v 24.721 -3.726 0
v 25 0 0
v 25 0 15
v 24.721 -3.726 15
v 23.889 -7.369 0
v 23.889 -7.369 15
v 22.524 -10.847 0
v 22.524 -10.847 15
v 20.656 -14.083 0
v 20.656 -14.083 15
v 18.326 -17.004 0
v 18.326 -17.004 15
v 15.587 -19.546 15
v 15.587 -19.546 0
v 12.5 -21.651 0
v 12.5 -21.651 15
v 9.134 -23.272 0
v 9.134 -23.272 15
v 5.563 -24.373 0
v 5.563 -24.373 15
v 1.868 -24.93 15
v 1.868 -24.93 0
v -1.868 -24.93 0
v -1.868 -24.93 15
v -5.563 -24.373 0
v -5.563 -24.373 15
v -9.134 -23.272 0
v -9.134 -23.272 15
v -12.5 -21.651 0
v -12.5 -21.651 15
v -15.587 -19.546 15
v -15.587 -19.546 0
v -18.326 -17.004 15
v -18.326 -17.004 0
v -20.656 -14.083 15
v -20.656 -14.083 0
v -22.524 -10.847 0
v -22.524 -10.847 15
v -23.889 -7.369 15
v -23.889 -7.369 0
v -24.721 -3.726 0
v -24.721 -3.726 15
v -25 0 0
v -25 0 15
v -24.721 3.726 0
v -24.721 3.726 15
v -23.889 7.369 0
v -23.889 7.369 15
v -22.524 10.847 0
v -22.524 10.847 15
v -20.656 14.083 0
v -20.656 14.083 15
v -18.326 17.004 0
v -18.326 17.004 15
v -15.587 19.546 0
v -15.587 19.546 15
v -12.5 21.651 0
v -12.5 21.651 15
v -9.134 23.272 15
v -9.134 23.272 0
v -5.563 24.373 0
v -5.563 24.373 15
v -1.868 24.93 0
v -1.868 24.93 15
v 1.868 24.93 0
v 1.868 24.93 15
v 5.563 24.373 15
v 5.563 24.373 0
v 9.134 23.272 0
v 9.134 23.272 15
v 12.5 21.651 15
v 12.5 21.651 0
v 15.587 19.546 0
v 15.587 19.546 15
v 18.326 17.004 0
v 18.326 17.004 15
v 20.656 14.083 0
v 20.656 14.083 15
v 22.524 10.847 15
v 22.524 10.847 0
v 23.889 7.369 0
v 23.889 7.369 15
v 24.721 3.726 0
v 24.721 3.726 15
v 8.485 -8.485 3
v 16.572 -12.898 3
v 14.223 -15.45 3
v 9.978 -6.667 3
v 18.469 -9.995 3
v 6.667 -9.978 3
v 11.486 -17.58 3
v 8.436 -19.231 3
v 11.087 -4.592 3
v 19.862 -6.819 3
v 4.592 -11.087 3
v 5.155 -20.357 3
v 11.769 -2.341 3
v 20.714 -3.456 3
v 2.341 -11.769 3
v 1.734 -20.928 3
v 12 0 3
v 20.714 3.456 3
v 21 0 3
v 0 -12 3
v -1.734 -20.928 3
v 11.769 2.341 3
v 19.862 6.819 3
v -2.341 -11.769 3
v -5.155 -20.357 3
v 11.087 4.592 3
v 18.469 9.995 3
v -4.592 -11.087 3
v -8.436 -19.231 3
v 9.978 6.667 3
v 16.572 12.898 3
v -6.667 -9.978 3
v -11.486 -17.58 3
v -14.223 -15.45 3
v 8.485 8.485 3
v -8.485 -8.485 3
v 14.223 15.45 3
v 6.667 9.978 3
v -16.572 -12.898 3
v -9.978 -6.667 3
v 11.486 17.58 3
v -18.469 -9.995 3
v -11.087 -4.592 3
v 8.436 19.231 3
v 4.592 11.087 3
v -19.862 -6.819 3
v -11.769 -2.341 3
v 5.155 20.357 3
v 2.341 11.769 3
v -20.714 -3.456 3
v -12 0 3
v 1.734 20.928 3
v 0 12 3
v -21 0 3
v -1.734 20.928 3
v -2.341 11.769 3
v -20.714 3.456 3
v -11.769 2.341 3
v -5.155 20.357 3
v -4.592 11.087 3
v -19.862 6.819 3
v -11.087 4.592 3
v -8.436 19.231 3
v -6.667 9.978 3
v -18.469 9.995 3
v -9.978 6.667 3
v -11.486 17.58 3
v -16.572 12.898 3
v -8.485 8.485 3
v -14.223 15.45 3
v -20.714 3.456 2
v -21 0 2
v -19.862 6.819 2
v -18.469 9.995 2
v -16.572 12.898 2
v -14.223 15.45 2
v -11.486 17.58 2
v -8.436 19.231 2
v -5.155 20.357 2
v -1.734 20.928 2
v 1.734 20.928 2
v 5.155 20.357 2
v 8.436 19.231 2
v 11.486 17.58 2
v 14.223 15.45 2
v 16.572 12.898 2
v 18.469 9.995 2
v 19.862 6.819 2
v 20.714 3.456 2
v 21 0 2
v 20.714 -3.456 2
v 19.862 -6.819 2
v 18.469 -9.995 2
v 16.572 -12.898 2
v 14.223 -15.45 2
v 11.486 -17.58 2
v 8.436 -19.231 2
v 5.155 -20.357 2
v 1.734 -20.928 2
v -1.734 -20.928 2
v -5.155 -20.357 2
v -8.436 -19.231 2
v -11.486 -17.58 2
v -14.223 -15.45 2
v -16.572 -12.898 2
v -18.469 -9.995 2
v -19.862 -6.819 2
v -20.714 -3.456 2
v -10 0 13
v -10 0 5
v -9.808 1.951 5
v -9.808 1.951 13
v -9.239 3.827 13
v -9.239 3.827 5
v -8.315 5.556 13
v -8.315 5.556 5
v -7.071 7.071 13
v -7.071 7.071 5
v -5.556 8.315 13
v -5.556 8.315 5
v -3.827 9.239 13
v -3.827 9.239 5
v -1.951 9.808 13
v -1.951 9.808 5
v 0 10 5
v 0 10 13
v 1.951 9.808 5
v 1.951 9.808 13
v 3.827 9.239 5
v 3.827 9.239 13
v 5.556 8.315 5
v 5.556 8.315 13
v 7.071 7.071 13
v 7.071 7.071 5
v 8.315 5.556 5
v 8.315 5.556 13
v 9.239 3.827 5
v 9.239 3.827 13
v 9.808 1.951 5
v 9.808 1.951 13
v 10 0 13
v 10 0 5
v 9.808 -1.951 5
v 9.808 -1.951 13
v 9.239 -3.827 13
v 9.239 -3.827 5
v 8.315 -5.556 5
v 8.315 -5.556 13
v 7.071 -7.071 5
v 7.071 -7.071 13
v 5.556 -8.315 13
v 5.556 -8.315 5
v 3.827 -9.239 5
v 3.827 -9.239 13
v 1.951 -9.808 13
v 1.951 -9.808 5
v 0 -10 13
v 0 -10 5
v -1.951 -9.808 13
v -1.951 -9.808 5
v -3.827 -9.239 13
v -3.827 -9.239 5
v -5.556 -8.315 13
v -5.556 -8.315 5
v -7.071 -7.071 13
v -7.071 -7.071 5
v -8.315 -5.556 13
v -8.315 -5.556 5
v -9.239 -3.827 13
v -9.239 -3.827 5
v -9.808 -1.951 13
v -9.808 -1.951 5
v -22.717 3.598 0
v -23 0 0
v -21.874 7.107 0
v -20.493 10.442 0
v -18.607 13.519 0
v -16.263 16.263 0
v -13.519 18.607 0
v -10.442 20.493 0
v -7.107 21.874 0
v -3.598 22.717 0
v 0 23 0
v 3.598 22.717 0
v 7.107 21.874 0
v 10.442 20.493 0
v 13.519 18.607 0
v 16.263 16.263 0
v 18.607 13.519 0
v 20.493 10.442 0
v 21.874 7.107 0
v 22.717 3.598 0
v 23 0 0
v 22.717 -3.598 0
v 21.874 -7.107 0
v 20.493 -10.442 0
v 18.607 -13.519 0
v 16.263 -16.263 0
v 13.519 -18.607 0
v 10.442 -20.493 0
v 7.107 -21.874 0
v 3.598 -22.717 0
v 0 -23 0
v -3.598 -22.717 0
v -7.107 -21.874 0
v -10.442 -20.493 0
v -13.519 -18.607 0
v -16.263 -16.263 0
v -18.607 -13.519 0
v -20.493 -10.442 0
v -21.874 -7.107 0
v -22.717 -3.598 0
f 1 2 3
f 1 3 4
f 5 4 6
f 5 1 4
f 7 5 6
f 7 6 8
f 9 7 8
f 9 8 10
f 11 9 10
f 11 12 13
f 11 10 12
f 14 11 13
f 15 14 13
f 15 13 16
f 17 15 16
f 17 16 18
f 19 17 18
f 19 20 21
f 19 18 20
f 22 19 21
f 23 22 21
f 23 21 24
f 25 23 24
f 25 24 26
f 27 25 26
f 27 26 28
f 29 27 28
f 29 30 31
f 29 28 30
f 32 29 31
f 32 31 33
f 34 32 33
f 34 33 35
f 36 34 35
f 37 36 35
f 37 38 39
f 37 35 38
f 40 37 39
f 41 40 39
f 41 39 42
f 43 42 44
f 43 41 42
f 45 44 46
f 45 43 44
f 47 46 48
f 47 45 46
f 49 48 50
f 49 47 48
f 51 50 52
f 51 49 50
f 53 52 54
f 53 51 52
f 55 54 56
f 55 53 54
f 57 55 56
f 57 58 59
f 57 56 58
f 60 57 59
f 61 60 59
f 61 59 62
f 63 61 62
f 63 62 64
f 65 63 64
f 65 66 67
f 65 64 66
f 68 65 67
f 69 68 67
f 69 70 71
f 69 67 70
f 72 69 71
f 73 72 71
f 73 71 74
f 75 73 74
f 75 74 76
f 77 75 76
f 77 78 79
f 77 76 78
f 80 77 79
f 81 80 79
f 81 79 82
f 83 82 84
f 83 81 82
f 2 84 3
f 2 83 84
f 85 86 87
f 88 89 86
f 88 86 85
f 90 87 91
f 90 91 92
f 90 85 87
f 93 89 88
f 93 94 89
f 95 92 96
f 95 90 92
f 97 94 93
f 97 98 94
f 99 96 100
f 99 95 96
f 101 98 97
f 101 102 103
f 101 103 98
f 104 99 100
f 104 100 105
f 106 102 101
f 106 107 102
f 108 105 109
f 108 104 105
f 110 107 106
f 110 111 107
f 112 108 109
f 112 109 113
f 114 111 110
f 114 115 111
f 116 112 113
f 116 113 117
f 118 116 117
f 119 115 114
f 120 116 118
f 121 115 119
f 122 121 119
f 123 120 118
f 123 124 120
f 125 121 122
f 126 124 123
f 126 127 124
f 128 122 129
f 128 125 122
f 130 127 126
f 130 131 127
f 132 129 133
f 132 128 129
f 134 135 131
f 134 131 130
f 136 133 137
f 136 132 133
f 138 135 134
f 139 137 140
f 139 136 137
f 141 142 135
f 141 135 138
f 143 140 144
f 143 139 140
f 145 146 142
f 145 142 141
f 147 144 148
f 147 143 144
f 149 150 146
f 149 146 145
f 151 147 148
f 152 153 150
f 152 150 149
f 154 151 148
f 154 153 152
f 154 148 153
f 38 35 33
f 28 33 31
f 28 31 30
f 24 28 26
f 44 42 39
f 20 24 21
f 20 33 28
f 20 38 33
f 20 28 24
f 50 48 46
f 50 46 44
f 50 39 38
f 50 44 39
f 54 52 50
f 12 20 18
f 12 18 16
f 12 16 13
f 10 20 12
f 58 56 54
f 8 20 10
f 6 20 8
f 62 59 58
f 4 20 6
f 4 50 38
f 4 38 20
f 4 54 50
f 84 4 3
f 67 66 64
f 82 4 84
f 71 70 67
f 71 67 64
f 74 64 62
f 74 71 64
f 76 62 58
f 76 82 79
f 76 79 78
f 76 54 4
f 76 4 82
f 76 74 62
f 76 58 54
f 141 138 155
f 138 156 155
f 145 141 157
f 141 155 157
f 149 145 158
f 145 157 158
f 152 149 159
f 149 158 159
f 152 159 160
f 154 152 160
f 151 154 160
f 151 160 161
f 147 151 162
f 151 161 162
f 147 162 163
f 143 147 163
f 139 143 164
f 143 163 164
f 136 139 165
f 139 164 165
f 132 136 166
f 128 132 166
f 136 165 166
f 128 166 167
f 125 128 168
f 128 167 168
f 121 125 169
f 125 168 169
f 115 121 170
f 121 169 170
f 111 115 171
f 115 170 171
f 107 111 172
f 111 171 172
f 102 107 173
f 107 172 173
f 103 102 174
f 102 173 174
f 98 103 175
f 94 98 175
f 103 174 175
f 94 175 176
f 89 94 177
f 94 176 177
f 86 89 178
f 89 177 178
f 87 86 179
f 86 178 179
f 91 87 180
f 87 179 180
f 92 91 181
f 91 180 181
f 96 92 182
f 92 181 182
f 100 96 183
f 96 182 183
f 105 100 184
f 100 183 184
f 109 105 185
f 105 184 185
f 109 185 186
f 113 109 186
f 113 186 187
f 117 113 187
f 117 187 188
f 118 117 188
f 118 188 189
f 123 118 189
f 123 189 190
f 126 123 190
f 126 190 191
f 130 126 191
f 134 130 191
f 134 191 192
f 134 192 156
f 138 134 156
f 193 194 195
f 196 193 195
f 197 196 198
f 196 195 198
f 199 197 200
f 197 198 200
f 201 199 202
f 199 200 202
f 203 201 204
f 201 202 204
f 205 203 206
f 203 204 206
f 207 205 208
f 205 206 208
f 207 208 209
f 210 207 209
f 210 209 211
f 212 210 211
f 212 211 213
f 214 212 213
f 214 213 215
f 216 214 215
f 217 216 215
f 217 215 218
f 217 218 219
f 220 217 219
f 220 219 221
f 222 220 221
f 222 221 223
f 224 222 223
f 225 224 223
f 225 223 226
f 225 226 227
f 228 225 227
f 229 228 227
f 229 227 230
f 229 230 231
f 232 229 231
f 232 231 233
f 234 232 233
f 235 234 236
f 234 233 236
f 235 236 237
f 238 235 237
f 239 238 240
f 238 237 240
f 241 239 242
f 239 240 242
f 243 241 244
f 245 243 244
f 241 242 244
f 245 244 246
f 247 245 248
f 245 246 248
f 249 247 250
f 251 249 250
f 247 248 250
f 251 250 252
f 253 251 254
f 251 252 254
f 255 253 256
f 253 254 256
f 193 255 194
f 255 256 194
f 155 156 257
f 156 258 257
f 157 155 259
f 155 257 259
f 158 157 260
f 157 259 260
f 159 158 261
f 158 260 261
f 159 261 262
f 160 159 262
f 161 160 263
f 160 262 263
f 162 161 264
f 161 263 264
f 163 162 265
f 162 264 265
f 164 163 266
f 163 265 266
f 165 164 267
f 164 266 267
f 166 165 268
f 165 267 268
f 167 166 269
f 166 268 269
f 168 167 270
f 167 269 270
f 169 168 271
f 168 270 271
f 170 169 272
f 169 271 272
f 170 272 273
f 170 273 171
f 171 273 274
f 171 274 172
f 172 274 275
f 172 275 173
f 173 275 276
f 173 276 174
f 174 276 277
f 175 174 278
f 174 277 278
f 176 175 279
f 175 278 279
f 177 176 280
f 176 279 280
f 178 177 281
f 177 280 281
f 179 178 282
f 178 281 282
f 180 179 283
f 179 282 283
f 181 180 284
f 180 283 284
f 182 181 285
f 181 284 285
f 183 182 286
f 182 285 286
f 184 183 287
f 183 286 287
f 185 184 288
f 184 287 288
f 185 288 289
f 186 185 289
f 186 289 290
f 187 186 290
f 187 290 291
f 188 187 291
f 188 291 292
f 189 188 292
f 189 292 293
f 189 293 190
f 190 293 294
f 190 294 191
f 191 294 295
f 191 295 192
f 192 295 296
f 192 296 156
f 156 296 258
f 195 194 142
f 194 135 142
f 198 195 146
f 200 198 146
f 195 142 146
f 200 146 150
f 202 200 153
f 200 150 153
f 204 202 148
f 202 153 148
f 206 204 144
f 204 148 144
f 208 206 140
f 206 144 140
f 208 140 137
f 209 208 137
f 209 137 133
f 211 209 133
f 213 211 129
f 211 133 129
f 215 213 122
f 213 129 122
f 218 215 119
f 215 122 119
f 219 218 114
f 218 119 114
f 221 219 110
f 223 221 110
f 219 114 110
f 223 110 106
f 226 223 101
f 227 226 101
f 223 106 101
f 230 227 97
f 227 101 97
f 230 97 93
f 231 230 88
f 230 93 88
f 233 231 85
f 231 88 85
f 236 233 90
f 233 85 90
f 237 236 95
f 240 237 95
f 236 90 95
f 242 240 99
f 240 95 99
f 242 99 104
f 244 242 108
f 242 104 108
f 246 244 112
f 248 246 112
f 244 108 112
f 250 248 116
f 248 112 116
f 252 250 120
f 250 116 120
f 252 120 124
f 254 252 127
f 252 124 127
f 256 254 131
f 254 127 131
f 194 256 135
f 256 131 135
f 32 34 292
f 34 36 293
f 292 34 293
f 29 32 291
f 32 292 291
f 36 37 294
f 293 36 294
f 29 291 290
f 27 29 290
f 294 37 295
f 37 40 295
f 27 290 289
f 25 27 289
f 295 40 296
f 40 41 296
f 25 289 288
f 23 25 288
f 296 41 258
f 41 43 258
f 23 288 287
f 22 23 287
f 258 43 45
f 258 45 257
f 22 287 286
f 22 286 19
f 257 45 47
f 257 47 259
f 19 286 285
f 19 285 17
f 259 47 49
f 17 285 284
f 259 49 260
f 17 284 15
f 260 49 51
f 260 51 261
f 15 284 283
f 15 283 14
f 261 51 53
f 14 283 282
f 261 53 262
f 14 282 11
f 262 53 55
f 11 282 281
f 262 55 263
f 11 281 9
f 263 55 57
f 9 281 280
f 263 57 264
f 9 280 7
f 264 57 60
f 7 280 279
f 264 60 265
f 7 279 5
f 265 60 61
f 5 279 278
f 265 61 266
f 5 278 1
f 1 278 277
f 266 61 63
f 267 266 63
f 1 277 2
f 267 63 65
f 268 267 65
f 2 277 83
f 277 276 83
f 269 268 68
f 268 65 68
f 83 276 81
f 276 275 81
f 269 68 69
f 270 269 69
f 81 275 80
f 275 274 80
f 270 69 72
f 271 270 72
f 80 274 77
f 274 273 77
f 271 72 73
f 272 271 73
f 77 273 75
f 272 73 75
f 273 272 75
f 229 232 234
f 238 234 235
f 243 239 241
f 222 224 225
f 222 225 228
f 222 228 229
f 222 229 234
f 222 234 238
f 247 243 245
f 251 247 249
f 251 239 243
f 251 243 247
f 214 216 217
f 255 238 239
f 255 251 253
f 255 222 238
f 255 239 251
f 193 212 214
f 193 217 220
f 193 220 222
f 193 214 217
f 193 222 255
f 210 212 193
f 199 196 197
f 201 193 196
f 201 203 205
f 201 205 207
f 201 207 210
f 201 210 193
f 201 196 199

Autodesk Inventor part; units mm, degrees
ref_plane "YZ Plane" through (0, 0, 0) normal (1, 0, 0) x (0, 1, 0)
ref_plane "XZ Plane" through (0, 0, 0) normal (0, 1, 0) x (-1, 0, 0)
ref_plane "XY Plane" through (0, 0, 0) normal (0, 0, 1) x (1, 0, 0)
sketch "スケッチ1" plane through (0, 0, 0) normal (0, 0, 1) x (1, 0, 0)
  circle A0 centre (0, 0) radius 25
  dimension "d0" = 50
extrude "押し出し1" add sketch "スケッチ1" along normal blind 15
sketch "スケッチ2" plane through (0, 0, 0) normal (0, 0, -1) x (-1, 0, 0)
  circle A0 centre (0, 0) radius 10
  circle A1 centre (0, 0) radius 21
  dimension "d3" = 20
  dimension "d6" = 42
extrude "押し出し2" cut sketch "スケッチ2" against normal blind 13 contours A0
extrude "押し出し3" cut sketch "スケッチ2" against normal blind 3
chamfer "面取り1" distance 2 angle 45 1 edges at (21, 0, 0)
chamfer "面取り2" distance 2 angle 45 1 edges at (10, 0, 3)
properties part number "storage"
